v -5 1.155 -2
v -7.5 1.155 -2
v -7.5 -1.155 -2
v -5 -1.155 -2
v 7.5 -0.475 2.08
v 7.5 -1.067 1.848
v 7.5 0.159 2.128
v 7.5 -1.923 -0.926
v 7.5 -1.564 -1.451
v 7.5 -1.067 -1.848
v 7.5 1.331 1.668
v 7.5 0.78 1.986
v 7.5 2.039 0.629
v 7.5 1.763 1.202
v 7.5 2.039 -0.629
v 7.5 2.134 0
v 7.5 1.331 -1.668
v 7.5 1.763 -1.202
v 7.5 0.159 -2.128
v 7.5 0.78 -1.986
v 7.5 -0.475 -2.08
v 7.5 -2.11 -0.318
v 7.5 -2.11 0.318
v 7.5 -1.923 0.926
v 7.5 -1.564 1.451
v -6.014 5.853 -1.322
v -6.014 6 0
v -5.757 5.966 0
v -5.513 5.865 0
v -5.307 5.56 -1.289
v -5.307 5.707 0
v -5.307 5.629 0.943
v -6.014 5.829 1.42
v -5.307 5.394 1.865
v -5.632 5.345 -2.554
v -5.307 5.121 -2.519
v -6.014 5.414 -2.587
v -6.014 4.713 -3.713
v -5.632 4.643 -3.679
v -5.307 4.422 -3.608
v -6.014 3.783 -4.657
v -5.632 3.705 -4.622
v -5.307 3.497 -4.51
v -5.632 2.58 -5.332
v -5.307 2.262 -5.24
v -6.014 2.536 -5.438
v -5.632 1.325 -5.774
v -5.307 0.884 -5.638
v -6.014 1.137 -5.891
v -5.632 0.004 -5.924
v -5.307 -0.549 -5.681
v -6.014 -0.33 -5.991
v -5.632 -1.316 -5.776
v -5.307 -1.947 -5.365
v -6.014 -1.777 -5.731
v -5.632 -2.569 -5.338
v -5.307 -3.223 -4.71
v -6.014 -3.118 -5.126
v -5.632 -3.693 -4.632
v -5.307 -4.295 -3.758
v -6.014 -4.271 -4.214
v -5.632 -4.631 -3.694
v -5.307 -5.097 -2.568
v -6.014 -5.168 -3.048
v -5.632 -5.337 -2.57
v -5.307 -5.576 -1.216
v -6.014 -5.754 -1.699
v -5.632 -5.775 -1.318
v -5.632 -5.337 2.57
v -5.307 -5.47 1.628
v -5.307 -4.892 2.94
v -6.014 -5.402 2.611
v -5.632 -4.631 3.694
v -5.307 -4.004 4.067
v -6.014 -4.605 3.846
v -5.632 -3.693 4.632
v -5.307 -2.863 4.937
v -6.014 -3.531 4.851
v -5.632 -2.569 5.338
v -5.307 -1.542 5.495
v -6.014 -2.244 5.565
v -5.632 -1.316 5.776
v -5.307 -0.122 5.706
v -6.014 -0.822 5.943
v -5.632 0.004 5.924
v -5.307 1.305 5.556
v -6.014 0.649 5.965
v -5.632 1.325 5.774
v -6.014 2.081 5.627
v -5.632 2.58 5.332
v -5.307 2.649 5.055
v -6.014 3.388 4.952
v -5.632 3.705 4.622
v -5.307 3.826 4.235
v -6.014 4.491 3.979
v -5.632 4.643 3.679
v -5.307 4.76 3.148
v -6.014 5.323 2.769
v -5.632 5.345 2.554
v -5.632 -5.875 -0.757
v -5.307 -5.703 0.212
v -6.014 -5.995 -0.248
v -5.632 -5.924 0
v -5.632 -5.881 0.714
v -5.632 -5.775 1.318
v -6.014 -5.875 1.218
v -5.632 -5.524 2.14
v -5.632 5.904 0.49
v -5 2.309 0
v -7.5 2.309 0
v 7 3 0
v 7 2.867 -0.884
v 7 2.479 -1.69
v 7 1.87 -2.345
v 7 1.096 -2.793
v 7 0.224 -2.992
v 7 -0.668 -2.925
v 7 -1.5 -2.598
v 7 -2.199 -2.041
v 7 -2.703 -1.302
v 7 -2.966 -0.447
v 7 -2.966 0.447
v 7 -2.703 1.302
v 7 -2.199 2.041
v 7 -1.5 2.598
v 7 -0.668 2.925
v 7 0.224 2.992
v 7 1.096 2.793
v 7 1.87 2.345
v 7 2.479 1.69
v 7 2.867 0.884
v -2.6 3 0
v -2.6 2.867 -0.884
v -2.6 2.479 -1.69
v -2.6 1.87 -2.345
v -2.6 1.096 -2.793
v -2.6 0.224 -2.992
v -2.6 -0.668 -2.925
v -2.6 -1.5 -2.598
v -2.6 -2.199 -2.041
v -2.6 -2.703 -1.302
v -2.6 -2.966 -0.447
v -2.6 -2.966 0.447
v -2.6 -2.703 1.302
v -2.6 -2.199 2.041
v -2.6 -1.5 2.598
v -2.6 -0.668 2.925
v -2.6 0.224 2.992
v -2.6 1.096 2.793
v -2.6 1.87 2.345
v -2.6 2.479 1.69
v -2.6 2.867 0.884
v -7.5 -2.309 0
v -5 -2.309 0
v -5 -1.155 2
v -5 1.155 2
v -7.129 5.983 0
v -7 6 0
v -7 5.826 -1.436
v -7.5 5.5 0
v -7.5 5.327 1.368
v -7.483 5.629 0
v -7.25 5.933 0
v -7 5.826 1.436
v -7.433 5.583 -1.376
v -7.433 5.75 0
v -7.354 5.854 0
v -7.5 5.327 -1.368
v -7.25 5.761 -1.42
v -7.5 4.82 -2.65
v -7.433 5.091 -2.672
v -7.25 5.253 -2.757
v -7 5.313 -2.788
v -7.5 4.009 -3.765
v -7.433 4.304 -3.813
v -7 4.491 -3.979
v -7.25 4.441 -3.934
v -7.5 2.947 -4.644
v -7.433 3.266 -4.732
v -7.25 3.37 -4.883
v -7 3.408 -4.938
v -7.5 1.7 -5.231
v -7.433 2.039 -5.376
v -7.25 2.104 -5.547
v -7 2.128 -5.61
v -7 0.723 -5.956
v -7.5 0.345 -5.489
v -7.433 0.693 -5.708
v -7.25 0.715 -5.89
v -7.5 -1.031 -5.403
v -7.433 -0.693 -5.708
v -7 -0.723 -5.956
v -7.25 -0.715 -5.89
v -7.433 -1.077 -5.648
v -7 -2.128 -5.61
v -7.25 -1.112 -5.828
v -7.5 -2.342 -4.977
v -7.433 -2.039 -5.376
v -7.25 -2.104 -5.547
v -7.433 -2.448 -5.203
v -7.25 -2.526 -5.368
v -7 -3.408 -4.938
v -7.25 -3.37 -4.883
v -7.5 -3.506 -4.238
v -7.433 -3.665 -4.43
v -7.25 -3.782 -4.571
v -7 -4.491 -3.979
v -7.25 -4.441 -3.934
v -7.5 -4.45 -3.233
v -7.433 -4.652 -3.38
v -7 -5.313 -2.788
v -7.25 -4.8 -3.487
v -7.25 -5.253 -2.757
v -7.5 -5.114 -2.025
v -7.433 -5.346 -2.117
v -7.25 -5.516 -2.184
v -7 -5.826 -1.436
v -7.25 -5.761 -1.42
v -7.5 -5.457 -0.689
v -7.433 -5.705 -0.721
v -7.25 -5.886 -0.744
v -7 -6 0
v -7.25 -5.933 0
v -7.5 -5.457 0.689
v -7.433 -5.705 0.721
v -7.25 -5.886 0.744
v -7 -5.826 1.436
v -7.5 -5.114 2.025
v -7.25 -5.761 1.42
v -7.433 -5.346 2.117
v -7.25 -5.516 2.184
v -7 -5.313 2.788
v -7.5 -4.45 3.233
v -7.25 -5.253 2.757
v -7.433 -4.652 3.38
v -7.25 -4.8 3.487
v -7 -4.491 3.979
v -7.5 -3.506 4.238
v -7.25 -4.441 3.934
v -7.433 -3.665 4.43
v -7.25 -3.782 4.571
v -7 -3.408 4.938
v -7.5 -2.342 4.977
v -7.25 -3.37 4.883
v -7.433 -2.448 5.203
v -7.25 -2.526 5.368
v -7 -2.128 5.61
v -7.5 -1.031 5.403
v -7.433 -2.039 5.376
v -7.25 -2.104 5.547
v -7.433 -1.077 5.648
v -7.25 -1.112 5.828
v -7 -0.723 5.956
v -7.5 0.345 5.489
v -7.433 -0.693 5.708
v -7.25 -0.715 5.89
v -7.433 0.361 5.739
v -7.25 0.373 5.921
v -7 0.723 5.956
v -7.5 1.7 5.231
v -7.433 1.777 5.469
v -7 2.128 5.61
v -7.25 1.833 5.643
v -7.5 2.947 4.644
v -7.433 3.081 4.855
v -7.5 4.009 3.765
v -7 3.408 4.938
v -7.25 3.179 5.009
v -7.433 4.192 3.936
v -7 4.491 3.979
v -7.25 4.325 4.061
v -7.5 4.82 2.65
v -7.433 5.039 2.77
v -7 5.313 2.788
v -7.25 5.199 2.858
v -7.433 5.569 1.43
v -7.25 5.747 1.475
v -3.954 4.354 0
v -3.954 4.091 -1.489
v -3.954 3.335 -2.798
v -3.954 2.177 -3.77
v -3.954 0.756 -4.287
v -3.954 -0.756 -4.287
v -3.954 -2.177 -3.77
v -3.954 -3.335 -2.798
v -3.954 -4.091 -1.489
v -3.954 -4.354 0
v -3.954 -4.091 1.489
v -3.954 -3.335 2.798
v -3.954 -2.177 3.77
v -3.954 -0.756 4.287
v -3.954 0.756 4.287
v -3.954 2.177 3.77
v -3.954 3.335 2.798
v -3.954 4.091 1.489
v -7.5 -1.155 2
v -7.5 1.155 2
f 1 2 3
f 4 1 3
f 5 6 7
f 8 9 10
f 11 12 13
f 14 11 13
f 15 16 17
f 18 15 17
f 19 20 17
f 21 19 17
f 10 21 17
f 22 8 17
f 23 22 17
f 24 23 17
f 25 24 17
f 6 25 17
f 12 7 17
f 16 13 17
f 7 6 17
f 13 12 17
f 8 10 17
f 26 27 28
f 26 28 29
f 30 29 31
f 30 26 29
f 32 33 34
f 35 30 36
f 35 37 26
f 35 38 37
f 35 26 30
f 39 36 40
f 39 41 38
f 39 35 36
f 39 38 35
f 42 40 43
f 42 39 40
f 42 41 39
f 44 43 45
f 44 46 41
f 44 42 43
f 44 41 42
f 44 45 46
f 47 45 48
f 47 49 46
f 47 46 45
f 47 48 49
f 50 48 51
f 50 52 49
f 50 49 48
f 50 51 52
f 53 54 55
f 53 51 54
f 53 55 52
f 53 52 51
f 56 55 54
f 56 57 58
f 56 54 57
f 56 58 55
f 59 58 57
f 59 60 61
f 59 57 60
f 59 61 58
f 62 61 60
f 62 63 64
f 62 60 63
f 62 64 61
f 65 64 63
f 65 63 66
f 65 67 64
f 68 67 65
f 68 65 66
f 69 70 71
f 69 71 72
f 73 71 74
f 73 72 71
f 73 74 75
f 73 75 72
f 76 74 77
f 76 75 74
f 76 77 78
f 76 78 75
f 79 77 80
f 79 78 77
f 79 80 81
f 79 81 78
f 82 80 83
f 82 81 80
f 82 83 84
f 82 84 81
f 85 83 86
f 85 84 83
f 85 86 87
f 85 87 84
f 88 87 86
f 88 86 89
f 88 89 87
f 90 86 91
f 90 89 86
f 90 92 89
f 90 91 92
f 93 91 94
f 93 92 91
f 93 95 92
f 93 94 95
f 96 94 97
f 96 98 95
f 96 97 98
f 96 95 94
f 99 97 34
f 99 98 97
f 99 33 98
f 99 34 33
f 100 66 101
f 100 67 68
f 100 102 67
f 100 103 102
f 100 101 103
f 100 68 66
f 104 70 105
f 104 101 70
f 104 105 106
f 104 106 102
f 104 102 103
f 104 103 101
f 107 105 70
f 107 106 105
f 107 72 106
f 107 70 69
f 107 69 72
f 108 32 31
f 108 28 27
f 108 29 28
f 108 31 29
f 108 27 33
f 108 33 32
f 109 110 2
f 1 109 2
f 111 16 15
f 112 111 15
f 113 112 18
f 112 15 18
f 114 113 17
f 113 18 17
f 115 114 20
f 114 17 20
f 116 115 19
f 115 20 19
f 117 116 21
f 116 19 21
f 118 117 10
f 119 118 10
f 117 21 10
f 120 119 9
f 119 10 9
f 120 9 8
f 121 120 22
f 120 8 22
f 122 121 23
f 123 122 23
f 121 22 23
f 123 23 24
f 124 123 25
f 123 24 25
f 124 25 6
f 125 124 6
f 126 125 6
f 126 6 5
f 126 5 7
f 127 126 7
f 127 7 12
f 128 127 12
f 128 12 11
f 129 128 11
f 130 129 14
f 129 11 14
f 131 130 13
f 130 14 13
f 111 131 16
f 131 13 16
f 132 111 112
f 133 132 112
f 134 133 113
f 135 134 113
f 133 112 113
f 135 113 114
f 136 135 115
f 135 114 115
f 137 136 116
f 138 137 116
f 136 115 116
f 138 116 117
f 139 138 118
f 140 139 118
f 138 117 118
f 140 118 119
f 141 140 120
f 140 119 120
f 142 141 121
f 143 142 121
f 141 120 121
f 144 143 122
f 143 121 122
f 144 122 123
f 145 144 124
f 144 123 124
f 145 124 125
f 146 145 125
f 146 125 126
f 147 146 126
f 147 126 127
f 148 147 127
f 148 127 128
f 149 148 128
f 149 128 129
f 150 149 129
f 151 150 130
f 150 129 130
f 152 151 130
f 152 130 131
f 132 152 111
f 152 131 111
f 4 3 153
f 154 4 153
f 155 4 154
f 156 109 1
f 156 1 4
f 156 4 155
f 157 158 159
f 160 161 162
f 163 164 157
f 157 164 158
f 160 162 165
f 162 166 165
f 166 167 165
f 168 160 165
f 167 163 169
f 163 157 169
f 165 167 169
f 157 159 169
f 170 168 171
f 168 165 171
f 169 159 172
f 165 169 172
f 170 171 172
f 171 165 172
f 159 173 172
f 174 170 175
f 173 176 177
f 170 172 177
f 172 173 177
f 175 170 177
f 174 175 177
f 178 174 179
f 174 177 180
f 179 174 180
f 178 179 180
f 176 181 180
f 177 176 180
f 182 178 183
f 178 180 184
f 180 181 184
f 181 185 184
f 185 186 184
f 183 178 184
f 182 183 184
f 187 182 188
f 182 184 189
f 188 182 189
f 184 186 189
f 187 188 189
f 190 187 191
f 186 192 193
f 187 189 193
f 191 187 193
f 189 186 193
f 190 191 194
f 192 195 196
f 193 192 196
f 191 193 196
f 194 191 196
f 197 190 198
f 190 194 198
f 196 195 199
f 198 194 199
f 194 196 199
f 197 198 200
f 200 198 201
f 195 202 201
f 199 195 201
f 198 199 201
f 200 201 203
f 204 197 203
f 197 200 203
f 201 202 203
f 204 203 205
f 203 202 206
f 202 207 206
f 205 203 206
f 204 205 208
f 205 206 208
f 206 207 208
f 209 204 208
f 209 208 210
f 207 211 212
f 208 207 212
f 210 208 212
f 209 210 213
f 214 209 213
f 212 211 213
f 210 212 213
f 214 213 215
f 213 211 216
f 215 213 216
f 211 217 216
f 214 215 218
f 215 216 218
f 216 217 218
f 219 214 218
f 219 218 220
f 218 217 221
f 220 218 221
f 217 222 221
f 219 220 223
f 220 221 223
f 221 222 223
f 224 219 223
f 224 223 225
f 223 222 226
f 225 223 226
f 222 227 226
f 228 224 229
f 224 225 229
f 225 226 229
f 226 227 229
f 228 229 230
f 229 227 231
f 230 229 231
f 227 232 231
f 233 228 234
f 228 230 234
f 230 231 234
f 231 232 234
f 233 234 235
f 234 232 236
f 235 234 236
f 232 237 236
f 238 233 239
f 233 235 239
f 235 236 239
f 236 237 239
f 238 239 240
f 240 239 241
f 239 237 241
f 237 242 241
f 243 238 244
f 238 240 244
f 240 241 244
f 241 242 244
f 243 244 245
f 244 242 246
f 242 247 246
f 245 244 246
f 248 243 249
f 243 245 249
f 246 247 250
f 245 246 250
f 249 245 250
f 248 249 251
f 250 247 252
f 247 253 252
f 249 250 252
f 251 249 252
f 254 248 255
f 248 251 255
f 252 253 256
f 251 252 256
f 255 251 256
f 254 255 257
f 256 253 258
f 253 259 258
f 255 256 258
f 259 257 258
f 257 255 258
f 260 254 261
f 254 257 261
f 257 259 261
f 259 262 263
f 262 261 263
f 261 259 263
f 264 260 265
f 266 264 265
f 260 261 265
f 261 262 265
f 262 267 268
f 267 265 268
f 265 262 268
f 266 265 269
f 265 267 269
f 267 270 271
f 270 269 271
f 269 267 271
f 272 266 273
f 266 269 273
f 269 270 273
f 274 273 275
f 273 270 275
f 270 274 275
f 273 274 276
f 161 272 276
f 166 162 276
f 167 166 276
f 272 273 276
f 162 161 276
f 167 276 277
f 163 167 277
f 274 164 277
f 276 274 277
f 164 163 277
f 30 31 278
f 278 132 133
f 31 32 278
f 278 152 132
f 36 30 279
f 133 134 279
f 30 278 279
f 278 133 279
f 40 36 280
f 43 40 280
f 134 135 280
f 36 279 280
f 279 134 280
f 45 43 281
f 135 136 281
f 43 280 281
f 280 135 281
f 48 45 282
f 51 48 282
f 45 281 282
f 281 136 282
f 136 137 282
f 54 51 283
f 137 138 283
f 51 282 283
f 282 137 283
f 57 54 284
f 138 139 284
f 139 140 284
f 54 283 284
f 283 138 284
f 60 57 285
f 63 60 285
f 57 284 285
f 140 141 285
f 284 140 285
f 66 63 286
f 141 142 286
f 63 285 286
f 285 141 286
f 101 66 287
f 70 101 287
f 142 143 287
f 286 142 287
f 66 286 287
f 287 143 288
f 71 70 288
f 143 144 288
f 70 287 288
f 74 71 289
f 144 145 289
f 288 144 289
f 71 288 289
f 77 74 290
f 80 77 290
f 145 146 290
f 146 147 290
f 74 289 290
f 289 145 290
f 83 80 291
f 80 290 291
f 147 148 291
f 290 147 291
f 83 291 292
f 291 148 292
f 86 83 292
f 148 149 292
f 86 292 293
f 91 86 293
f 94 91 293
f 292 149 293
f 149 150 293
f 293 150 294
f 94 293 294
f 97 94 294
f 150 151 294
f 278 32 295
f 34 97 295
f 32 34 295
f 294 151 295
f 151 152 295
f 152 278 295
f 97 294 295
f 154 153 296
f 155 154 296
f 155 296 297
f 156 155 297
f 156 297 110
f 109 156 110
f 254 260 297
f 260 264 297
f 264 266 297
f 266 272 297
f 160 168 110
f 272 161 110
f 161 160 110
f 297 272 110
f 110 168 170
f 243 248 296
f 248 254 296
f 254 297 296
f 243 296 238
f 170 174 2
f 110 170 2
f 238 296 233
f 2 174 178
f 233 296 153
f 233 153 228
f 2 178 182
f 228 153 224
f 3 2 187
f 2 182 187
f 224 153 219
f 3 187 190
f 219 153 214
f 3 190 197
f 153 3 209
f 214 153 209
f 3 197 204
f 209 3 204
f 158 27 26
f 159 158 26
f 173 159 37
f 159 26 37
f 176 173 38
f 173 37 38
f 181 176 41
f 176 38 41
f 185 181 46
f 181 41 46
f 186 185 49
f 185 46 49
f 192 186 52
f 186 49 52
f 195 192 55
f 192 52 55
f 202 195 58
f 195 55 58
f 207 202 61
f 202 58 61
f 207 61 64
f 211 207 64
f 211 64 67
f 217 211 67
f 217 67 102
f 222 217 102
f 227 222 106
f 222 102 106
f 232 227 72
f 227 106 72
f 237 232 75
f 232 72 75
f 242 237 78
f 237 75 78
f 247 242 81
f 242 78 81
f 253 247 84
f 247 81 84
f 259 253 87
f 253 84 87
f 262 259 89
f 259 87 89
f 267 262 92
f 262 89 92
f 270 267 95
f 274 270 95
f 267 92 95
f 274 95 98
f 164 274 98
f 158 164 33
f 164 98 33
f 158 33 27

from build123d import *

# Parameters (mm, degrees)
FILLET_1_R          = 0.5
FILLET_2_R          = 1
CUT_EXTRUDE_1_DEPTH = 2.5
CHAMFER_1_SIZE      = 0.5
CHAMFER_1_SIZE2     = 0.866025404


with BuildPart() as part:
    # 草图1 → 旋转1 (revolve)
    with BuildSketch(Plane.XY):
        Polygon((7.5, 0), (-7.5, 0), (-7.5, 6), (-5.6, 6), (-2.6, 3), (7.5, 3), align=None)
    revolve(axis=Axis((7.5, 0, 0), (-1, 0, 0)))

    # 圆角1
    fillet_1_edges = [part.edges().sort_by_distance(p)[0] for p in [
        (-7.5, -6, 0),
    ]]
    fillet(fillet_1_edges, radius=FILLET_1_R)

    # 圆角2
    fillet_2_edges = [part.edges().sort_by_distance(p)[0] for p in [
        (-5.6, -6, 0),
    ]]
    fillet(fillet_2_edges, radius=FILLET_2_R)

    # 草图2 → 切除-拉伸1 (cut)
    with BuildSketch(Plane.ZY.offset(7.5)):
        Polygon((0, 2.309401077), (-2, 1.154700538), (-2, -1.154700538), (0, -2.309401077), (2, -1.154700538), (2, 1.154700538), align=None)
    extrude(amount=-CUT_EXTRUDE_1_DEPTH, mode=Mode.SUBTRACT)

    # 倒角1
    chamfer_1_edges = [part.edges().sort_by_distance(p)[0] for p in [
        (7.5, -3, 0),
    ]]
    chamfer_1_side = [part.faces().sort_by_distance(p)[0] for p in [
        (2.45, -3, 0),
    ]]
    chamfer(chamfer_1_edges, length=CHAMFER_1_SIZE, length2=CHAMFER_1_SIZE2, reference=chamfer_1_side[0])


solid = part.part
